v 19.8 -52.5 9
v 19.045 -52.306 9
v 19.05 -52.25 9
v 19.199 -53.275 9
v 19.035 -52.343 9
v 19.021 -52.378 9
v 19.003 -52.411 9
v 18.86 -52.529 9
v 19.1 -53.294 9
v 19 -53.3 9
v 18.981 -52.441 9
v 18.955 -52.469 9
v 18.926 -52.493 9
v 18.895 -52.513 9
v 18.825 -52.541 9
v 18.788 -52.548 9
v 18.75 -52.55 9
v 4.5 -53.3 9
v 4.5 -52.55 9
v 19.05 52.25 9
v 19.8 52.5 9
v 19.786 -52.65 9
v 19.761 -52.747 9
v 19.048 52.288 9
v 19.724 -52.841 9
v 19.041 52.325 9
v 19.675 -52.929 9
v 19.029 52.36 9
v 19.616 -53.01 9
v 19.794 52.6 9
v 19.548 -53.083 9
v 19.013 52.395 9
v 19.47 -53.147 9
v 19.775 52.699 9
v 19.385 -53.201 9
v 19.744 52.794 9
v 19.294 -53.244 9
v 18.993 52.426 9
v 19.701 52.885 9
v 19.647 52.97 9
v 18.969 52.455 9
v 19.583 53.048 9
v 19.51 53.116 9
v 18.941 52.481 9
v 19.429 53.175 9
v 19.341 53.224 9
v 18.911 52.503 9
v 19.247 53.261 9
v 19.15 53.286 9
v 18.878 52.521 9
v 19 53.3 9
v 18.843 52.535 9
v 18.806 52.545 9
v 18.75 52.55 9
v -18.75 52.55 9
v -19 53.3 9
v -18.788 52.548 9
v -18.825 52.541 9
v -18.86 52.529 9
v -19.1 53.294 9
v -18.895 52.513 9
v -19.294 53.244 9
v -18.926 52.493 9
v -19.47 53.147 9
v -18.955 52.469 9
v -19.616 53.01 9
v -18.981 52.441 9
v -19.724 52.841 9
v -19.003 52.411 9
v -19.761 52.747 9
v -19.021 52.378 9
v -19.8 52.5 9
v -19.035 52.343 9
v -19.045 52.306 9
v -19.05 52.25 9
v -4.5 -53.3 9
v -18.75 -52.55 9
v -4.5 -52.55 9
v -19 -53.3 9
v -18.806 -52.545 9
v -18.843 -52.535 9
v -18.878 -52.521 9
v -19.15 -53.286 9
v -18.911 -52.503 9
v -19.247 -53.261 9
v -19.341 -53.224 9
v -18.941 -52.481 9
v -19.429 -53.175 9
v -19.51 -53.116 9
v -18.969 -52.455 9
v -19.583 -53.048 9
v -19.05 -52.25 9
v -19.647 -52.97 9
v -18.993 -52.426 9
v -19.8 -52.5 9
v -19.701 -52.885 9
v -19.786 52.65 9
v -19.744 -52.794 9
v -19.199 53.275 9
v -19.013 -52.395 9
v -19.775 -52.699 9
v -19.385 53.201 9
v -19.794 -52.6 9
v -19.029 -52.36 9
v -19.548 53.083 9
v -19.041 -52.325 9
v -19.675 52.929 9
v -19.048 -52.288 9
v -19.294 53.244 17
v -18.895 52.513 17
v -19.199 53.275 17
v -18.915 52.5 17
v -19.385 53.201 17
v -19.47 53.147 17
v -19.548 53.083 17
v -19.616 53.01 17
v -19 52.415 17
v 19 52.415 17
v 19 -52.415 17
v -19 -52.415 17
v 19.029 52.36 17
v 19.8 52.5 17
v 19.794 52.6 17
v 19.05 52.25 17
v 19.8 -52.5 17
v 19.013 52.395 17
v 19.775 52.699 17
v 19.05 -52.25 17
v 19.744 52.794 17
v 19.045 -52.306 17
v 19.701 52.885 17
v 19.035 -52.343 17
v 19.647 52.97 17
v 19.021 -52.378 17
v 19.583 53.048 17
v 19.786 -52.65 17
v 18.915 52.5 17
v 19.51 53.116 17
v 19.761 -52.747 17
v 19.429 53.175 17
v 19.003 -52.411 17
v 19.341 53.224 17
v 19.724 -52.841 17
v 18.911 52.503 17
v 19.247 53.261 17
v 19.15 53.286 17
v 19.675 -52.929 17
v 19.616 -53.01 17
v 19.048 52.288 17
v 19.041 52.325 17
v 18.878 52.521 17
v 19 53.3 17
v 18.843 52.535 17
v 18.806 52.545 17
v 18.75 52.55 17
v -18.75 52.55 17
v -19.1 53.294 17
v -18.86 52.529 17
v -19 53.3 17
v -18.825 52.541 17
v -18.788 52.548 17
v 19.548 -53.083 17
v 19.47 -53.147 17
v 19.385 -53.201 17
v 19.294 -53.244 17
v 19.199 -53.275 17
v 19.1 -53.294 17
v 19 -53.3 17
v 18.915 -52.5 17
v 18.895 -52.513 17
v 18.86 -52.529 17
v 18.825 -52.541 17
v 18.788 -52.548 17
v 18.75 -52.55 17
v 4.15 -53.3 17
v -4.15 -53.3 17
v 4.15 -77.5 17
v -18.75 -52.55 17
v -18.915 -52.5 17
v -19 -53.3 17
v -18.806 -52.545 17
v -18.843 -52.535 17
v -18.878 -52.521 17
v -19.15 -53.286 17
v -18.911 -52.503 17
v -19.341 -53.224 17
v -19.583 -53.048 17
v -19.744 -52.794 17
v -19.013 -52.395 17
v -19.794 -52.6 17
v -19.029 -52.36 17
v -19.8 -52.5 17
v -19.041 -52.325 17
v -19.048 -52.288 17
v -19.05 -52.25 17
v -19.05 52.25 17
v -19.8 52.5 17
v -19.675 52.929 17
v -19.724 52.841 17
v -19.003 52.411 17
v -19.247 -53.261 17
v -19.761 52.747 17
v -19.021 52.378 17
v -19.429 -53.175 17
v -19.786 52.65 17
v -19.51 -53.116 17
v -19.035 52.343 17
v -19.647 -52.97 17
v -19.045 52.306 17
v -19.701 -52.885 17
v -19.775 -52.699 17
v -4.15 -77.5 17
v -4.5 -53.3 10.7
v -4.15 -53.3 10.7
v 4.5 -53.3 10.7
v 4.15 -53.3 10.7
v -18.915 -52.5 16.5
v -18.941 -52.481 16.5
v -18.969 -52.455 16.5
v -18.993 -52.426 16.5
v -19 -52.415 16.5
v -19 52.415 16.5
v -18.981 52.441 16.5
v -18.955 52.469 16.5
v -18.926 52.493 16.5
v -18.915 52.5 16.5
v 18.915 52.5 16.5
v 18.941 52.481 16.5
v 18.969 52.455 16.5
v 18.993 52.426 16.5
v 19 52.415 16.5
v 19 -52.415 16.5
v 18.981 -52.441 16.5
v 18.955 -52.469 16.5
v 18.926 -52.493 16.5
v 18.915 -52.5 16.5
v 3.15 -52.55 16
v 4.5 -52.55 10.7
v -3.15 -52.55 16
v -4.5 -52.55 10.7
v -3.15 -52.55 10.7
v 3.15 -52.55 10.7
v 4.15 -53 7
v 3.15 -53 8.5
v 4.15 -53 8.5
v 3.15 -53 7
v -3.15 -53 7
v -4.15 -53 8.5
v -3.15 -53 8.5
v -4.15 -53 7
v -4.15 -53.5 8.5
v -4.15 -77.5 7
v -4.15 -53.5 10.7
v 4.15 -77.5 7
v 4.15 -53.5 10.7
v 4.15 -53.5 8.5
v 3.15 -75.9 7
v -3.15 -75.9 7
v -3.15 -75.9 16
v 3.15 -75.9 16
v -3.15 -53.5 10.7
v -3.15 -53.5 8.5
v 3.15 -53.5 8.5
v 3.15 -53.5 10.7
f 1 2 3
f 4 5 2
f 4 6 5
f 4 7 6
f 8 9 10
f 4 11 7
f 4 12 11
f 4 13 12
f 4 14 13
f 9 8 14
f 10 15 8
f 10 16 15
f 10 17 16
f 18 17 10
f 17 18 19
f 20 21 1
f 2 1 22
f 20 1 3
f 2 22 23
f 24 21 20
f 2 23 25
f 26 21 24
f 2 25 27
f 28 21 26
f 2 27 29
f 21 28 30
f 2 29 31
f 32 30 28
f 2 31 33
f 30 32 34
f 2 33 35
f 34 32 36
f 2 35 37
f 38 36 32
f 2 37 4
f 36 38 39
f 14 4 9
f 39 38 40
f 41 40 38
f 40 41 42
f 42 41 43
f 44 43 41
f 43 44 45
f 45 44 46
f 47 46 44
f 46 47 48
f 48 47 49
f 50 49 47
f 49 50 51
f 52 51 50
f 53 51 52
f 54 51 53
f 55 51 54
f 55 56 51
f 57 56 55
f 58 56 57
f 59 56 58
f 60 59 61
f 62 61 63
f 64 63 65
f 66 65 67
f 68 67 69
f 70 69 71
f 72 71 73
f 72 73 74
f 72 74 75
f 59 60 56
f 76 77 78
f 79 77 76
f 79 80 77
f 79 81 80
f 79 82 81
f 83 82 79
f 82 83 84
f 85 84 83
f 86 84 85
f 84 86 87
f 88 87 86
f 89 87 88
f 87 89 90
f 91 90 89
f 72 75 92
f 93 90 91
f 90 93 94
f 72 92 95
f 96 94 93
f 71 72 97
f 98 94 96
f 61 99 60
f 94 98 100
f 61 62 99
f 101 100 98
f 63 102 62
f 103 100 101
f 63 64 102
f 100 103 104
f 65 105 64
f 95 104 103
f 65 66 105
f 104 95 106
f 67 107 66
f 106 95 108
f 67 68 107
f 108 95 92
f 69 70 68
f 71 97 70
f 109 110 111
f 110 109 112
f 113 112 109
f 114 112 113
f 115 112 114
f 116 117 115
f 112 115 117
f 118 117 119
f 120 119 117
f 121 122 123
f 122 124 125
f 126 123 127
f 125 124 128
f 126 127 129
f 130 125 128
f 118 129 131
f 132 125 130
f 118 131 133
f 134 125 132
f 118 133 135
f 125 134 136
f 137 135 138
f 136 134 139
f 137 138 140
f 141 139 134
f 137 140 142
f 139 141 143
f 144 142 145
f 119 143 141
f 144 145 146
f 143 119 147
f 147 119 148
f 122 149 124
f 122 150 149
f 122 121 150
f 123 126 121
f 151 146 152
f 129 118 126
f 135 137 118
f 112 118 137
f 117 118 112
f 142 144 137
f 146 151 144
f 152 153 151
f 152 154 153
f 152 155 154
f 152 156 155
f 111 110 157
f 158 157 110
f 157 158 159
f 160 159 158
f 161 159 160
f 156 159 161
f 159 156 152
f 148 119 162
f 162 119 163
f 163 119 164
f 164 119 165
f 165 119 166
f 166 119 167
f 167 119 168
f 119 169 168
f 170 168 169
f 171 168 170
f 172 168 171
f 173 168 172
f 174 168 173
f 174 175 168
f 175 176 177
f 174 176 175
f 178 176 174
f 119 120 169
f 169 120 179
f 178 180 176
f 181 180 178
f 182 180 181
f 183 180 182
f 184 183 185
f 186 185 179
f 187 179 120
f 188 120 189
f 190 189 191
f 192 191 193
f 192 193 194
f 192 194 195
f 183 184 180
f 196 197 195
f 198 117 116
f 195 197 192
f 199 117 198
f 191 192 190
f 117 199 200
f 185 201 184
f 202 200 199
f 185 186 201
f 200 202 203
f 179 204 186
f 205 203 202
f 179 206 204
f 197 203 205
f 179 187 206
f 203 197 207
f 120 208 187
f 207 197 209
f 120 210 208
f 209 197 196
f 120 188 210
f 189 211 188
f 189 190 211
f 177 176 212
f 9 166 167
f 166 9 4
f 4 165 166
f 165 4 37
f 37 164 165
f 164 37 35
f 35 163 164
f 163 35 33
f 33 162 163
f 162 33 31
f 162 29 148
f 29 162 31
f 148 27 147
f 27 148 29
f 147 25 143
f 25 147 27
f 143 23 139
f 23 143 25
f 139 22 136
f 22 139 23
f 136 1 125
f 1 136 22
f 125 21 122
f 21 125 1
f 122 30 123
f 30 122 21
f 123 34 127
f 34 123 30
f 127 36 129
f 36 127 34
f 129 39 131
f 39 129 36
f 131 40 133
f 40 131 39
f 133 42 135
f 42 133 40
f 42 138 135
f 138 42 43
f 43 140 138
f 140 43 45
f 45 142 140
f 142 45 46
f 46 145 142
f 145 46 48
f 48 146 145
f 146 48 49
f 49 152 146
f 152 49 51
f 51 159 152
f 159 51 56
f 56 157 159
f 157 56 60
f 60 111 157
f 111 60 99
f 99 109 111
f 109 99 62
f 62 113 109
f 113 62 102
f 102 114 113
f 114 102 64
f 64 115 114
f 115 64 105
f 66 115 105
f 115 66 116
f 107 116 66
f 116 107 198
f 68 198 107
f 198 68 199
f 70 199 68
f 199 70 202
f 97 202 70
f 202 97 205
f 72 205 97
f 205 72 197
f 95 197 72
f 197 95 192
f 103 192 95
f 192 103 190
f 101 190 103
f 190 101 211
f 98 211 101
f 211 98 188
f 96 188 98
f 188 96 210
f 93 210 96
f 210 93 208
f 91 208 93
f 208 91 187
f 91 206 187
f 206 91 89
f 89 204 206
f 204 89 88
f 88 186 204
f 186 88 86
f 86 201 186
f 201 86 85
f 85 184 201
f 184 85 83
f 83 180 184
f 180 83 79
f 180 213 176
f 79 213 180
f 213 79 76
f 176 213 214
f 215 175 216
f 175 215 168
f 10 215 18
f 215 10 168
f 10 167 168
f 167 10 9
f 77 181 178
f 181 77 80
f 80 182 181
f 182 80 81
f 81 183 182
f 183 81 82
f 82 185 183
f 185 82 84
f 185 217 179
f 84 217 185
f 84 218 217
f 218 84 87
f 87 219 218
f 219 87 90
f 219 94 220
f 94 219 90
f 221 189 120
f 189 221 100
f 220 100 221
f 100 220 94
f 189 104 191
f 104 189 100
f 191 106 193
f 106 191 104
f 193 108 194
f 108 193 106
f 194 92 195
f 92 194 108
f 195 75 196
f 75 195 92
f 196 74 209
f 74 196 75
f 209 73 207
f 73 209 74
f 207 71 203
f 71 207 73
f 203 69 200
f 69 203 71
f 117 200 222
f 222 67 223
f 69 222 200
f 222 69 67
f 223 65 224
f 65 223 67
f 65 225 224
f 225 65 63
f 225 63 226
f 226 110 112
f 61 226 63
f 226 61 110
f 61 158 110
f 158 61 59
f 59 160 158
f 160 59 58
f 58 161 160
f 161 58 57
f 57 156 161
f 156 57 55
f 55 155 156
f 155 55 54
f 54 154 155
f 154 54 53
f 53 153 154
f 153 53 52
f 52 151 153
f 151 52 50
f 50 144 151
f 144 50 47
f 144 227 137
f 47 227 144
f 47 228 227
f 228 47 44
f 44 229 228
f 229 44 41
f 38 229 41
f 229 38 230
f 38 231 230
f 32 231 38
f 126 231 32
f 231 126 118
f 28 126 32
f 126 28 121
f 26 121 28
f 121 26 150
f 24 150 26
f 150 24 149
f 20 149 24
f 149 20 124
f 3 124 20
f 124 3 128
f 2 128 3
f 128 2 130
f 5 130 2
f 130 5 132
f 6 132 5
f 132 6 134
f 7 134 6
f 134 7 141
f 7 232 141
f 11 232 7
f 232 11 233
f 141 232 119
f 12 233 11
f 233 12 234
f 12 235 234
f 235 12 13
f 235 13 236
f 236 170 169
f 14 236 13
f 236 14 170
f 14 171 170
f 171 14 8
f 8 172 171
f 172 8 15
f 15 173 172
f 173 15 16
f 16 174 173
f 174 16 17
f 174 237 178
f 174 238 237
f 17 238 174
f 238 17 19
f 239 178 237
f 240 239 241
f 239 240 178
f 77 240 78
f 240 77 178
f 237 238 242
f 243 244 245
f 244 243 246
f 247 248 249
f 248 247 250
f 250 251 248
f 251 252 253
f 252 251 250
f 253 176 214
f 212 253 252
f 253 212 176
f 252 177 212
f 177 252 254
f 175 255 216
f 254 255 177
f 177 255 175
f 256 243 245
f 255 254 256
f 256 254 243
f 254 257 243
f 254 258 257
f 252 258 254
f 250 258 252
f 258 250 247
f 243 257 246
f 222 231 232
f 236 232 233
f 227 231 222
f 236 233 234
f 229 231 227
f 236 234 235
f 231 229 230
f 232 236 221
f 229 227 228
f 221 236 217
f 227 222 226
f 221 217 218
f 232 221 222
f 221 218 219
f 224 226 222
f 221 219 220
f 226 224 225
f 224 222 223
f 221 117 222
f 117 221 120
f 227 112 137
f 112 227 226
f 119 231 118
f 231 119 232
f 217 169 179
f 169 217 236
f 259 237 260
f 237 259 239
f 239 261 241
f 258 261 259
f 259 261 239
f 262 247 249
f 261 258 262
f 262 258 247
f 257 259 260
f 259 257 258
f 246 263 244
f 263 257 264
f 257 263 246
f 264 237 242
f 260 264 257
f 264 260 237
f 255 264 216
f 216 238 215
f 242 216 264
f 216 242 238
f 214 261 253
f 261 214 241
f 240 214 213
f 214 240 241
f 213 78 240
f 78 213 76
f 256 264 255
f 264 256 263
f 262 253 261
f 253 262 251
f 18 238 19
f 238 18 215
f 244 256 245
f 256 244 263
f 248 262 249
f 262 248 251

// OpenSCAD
$fn=50;

BOX_W = 38;
BOX_L = 105;
BOX_H = 8.0;
WALL = 0.5;
CORNER_RADIUS = 0.8;

MIC_OUTSIDE_WIDTH=8.3;
MIC_OUTSIDE_HEIGHT=10.0;
MIC_INSIDE_WIDTH=6.3;
MIC_LENGTH=24.5;

MIC_OFFSET_X = 0;
MIC_OFFSET_Y = -34.5;
MIC_OFFSET_Z = 0;

VENT_OFFSET = -4.5;
VENT_L = 19.0;
VENT_R = -19.0;

module roundedRectangle(width, length, radius) {
    difference() {
        offset(r=radius) square([width, length], center=true);
        offset(r=radius - WALL) square([width - WALL, length - WALL], center=true);
    }
}

module mainLid() {
    linear_extrude(BOX_H)
    roundedRectangle(BOX_W, BOX_L, CORNER_RADIUS);
}

module micBox() {
        translate([0, -53.0, 3])
        rotate([90, 0, 0])
        linear_extrude(MIC_LENGTH) square([MIC_OUTSIDE_WIDTH, MIC_OUTSIDE_HEIGHT], center=true);
    }
//}

module vent(x, y, vent_offset) {
    translate([x, y, BOX_H + vent_offset]) {
        rotate([90, 0, 90]) {
            cylinder(h=3.0, d=2.0, center=true);
        }
    }
}

module cutouts() {
    translate([MIC_OFFSET_X, MIC_OFFSET_Y, MIC_OFFSET_Z]) {
        // Inside mic channel
        translate([0, -13.8, BOX_H+3])
        rotate([90, 0, 0])
        linear_extrude(MIC_LENGTH+3.1) square([MIC_INSIDE_WIDTH, MIC_OUTSIDE_HEIGHT], center=true);
        
        // Mic lid clearance at mic box opening
        translate([0, -17, BOX_H+1.60])
        rotate([90, 0, 0])
        linear_extrude(2.0) square([9, 2.2], center=true);
    }

    // Cable exit
    translate([0, 54.0, BOX_H-2.5])
    rotate([90, 0, 0])
    linear_extrude(3.0) square([10, 6], center=true);

    /*
    // gas sensor vents
    vent(VENT_L, 29.0, VENT_OFFSET);
    vent(VENT_L, 21.0, VENT_OFFSET);
    vent(VENT_L, 13.0, VENT_OFFSET);
    vent(VENT_L, 5.0, VENT_OFFSET);
    vent(VENT_L, -3.0, VENT_OFFSET);
    vent(VENT_L, -11.0, VENT_OFFSET);
    
    vent(VENT_R, 29.0, VENT_OFFSET);
    vent(VENT_R, 21.0, VENT_OFFSET);
    vent(VENT_R, 13.0, VENT_OFFSET);
    vent(VENT_R, 5.0, VENT_OFFSET);
    vent(VENT_R, -3.0, VENT_OFFSET);
    vent(VENT_R, -11.0, VENT_OFFSET);
    */
}

difference() {
    union() {
        translate([0, 0, 9.0]) { // Moving the lid to the opposite side of the base frame
            mainLid();
            micBox();

            // This adds the base with the wall thickness
            translate([0, 0, BOX_H - WALL]) {
                linear_extrude(WALL) square([BOX_W, BOX_L], center=true);
            }
        }
    }
    cutouts();
}
